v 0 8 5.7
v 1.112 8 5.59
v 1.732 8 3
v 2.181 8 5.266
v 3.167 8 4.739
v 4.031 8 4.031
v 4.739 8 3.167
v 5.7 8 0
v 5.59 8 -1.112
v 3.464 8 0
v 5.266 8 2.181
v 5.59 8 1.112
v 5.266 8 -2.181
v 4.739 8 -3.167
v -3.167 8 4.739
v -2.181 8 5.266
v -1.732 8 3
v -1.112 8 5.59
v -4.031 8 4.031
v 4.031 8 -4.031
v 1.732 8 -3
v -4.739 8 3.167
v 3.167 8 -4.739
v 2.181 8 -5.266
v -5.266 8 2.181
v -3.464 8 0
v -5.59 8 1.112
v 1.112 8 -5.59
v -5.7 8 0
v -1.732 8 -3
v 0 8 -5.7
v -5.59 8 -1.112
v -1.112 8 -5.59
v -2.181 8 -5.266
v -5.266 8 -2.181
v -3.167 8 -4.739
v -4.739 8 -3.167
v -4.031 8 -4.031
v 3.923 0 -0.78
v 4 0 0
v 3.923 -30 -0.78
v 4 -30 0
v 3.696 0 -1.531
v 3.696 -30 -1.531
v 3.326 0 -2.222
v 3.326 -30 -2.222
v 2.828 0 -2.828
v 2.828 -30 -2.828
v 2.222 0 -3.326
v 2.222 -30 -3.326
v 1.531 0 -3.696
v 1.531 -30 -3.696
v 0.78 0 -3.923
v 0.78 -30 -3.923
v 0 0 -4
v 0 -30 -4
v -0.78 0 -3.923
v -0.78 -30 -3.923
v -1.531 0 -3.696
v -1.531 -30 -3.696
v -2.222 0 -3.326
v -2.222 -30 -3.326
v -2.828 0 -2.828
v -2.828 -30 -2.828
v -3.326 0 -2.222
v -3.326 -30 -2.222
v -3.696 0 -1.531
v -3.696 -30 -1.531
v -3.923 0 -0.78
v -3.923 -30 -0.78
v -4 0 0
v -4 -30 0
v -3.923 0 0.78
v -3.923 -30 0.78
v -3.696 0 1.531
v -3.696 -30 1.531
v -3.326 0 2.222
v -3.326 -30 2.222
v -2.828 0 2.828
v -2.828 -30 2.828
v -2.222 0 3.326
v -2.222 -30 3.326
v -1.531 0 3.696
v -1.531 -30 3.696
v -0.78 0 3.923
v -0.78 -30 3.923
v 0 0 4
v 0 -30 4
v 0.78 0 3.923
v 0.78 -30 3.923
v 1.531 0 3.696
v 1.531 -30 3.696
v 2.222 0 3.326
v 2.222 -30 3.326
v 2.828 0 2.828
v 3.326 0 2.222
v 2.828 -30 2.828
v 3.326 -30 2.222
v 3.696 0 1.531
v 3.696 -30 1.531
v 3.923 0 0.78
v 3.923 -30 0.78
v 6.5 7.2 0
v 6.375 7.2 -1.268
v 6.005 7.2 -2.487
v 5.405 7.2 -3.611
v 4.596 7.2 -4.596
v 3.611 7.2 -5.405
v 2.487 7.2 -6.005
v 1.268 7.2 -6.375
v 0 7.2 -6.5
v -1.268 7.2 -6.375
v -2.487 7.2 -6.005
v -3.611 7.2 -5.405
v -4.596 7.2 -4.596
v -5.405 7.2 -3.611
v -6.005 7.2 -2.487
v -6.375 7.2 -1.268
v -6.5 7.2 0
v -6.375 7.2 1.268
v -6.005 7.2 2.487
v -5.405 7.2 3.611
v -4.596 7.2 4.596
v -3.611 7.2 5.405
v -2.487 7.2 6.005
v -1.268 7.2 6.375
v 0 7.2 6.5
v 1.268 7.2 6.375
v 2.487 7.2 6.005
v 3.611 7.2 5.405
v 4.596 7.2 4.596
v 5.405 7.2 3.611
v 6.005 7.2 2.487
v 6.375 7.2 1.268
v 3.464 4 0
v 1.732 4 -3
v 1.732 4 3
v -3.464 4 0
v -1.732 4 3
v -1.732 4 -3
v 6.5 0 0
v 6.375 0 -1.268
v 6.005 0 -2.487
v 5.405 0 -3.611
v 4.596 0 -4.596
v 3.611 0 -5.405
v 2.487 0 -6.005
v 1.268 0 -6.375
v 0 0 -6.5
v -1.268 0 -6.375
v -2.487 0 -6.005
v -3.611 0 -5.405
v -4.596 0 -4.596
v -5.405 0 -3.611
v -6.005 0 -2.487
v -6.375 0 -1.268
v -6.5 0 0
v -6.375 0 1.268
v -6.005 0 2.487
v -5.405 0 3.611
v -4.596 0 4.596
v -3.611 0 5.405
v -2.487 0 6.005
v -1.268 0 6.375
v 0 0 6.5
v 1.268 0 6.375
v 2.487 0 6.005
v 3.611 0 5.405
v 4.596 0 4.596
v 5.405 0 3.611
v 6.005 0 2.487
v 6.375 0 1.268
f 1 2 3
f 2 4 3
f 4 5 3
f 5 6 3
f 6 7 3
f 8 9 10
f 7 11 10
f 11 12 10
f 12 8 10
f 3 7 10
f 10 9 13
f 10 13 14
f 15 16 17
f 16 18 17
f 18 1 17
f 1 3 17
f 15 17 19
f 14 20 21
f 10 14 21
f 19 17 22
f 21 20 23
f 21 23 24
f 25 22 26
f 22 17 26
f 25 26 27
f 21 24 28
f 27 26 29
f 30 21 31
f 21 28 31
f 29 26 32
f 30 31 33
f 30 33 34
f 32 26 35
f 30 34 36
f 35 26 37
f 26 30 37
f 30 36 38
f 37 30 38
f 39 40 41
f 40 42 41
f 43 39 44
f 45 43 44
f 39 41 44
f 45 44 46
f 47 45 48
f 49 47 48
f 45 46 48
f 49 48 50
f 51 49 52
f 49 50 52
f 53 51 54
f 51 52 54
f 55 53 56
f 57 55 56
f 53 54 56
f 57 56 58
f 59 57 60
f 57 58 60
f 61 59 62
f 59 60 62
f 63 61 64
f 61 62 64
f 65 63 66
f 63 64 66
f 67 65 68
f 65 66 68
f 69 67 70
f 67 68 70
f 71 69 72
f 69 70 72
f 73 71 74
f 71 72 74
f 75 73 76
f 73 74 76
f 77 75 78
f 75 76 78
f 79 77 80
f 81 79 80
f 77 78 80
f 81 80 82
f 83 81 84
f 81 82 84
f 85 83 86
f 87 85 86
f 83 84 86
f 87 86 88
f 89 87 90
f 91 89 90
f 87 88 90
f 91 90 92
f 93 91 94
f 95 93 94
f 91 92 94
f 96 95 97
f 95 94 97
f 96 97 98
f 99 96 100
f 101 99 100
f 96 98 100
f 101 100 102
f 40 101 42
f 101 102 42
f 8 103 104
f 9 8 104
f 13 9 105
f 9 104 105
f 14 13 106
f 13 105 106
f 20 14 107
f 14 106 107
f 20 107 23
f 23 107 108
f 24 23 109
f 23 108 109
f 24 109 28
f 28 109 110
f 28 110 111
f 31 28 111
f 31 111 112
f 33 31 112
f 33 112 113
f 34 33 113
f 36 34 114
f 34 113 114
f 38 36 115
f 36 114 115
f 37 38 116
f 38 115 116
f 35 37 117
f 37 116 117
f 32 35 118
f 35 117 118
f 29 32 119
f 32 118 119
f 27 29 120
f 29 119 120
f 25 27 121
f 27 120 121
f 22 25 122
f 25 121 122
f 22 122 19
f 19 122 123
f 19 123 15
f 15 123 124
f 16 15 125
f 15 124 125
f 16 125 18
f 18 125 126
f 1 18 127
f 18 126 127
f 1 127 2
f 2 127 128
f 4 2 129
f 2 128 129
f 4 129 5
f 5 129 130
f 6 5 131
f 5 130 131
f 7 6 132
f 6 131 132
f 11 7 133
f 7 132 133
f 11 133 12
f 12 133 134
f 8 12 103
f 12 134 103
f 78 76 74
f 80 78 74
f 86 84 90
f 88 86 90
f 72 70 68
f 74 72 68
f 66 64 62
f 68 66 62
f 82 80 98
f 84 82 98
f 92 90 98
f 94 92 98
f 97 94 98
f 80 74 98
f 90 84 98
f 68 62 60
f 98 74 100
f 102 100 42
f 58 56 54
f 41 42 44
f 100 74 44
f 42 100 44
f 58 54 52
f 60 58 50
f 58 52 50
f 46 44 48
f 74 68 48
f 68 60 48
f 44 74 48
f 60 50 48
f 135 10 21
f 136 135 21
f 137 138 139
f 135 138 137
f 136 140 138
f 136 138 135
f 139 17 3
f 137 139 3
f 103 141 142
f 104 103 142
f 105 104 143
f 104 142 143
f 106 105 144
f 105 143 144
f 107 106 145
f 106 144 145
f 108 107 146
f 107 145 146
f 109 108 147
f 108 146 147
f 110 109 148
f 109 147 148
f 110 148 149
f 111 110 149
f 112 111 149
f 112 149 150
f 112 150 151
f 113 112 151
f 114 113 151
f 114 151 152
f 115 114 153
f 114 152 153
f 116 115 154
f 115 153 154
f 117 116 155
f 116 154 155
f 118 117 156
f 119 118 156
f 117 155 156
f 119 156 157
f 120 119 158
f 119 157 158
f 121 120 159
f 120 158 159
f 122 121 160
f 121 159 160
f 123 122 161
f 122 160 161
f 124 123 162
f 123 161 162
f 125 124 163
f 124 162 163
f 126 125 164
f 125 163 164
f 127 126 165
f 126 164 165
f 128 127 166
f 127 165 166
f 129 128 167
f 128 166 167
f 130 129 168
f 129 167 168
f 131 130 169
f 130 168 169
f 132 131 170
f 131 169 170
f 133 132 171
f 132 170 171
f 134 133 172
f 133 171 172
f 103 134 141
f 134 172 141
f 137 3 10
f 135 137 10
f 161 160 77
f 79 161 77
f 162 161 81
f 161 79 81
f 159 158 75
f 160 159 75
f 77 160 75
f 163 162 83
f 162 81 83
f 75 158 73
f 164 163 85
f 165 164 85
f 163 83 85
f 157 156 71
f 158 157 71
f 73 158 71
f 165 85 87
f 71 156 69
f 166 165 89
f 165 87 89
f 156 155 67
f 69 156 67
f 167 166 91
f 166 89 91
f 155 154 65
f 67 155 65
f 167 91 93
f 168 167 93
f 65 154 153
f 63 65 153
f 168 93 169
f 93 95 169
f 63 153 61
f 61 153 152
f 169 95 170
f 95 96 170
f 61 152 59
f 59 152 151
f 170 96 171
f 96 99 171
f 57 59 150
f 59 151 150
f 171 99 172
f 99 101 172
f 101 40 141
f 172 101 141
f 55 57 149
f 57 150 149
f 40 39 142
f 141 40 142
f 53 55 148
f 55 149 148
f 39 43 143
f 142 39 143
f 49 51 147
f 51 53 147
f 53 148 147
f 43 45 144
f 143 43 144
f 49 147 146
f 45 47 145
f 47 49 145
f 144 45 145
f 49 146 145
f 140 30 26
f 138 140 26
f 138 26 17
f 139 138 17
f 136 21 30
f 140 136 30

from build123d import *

# Parameters (mm, degrees)
CUT_EXTRUDE1_DEPTH = 4
CHAMFER1_SIZE      = 0.8


with BuildPart() as part:
    # Sketch1 → Revolve1 (revolve)
    with BuildSketch(Plane.XY):
        Polygon((0, 8), (6.5, 8), (6.5, 0), (4, 0), (4, -30), (0, -30), align=None)
    revolve(axis=Axis((0, 0, 0), (0, 1, 0)))

    # Sketch2 → Cut-Extrude1 (cut)
    with BuildSketch(Plane(origin=(0, 8, 0), x_dir=(1, 0, 0), z_dir=(0, 1, 0))):
        Polygon((3.464101615, 0), (1.732050808, 3), (-1.732050808, 3), (-3.464101615, 0), (-1.732050808, -3), (1.732050808, -3), align=None)
    extrude(amount=-CUT_EXTRUDE1_DEPTH, mode=Mode.SUBTRACT)

    # Chamfer1
    chamfer1_edges = [part.edges().sort_by_distance(p)[0] for p in [
        (-6.5, 8, 0),
    ]]
    chamfer(chamfer1_edges, length=CHAMFER1_SIZE)


solid = part.part
